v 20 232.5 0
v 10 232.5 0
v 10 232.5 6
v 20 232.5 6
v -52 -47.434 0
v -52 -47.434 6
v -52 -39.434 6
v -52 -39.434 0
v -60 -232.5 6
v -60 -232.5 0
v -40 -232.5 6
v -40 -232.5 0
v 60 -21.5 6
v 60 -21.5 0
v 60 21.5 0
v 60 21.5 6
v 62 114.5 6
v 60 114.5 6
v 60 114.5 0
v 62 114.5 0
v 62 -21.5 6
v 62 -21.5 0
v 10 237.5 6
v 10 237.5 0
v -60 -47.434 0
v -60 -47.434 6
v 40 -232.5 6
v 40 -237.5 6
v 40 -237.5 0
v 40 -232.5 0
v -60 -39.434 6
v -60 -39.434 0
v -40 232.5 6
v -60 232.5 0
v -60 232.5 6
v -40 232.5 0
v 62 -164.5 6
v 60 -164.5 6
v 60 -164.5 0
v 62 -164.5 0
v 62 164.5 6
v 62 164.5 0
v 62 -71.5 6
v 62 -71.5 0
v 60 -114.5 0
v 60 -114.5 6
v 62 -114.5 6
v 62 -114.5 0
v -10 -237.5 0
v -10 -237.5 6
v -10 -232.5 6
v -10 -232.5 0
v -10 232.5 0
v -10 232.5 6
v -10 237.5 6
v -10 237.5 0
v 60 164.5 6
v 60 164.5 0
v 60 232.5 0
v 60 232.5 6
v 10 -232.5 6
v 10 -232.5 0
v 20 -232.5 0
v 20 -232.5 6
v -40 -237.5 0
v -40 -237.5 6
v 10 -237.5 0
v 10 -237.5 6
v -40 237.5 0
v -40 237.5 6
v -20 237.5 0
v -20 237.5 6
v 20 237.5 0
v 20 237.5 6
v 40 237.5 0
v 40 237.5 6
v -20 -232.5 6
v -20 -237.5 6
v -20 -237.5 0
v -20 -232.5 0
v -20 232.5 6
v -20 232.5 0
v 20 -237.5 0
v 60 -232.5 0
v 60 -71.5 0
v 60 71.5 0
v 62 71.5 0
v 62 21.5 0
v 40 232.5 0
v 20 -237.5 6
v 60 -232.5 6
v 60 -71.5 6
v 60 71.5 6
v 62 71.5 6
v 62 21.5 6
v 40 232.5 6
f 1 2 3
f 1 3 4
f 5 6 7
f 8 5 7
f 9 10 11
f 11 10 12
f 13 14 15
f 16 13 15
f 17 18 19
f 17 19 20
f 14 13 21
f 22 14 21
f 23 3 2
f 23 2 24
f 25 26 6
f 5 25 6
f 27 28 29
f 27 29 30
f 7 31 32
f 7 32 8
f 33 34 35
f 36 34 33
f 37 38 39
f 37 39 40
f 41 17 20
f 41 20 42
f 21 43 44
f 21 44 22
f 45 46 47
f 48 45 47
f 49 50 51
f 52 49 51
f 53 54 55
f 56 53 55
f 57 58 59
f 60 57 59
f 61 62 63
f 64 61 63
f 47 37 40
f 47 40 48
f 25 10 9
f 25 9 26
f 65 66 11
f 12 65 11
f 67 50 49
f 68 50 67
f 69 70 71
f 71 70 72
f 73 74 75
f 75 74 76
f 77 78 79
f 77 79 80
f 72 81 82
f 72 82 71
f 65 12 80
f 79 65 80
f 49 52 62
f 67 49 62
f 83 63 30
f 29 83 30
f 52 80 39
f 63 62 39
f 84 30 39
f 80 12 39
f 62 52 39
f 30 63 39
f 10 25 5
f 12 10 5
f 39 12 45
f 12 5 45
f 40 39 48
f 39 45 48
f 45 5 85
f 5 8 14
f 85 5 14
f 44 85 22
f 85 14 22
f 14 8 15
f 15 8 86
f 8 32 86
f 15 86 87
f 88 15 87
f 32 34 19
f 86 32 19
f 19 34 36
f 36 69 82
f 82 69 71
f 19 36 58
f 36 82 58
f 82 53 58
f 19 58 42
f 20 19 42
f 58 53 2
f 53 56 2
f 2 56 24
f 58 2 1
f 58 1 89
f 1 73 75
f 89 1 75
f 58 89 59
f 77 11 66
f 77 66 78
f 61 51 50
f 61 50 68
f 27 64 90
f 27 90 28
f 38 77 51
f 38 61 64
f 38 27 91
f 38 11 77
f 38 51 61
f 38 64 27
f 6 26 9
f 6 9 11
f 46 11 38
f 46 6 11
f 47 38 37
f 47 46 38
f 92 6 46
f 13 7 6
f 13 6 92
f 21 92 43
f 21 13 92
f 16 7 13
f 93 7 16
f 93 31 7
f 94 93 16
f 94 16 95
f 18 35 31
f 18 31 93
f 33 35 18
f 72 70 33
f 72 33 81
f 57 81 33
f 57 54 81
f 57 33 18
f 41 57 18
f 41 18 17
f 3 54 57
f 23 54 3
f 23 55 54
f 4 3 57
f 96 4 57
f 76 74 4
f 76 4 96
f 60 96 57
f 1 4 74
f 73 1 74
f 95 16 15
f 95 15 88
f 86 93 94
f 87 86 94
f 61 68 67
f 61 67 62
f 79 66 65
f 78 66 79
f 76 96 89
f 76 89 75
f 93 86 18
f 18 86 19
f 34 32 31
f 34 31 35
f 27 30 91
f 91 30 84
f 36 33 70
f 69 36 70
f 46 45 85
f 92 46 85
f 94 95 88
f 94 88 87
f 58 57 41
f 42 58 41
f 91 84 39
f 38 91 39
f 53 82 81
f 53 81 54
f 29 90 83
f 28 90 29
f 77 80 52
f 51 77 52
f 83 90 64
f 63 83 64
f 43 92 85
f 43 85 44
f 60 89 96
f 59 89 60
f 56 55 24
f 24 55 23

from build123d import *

# Parameters (mm, degrees)
SKETCH1_W           = 120
SKETCH1_H           = 465
BOSS_EXTRUDE1_DEPTH = 6
SKETCH4_W           = 20
SKETCH4_H           = 10
SKETCH4_W_2         = 4
SKETCH4_H_2         = 50
BOSS_EXTRUDE2_DEPTH = 6
SKETCH5_W           = 8
SKETCH5_H           = 8
CUT_EXTRUDE1_DEPTH  = 10


with BuildPart() as part:
    # Sketch1 → Boss-Extrude1 (new body)
    with BuildSketch(Plane.XY):
        Rectangle(SKETCH1_W, SKETCH1_H)
    extrude(amount=BOSS_EXTRUDE1_DEPTH)

    # Sketch4 → Boss-Extrude2 (add)
    with BuildSketch(Plane.XY.offset(6)):
        with Locations((-30, 232.5)):
            Rectangle(SKETCH4_W, SKETCH4_H)
        with Locations((0, 232.5)):
            Rectangle(SKETCH4_W, SKETCH4_H)
        with Locations((30, 232.5)):
            Rectangle(SKETCH4_W, SKETCH4_H)
        with Locations((-30, -232.5)):
            Rectangle(SKETCH4_W, SKETCH4_H)
        with Locations((0, -232.5)):
            Rectangle(SKETCH4_W, SKETCH4_H)
        with Locations((30, -232.5)):
            Rectangle(SKETCH4_W, SKETCH4_H)
        with Locations((60, 139.5)):
            Rectangle(SKETCH4_W_2, SKETCH4_H_2)
        with Locations((60, 46.5)):
            Rectangle(SKETCH4_W_2, SKETCH4_H_2)
        with Locations((60, -46.5)):
            Rectangle(SKETCH4_W_2, SKETCH4_H_2)
        with Locations((60, -139.5)):
            Rectangle(SKETCH4_W_2, SKETCH4_H_2)
    extrude(amount=-BOSS_EXTRUDE2_DEPTH)

    # Sketch5 → Cut-Extrude1 (cut)
    with BuildSketch(Plane.XY.offset(6)):
        with Locations((-56, -43.434460059)):
            Rectangle(SKETCH5_W, SKETCH5_H)
    extrude(amount=-CUT_EXTRUDE1_DEPTH, mode=Mode.SUBTRACT)


solid = part.part
